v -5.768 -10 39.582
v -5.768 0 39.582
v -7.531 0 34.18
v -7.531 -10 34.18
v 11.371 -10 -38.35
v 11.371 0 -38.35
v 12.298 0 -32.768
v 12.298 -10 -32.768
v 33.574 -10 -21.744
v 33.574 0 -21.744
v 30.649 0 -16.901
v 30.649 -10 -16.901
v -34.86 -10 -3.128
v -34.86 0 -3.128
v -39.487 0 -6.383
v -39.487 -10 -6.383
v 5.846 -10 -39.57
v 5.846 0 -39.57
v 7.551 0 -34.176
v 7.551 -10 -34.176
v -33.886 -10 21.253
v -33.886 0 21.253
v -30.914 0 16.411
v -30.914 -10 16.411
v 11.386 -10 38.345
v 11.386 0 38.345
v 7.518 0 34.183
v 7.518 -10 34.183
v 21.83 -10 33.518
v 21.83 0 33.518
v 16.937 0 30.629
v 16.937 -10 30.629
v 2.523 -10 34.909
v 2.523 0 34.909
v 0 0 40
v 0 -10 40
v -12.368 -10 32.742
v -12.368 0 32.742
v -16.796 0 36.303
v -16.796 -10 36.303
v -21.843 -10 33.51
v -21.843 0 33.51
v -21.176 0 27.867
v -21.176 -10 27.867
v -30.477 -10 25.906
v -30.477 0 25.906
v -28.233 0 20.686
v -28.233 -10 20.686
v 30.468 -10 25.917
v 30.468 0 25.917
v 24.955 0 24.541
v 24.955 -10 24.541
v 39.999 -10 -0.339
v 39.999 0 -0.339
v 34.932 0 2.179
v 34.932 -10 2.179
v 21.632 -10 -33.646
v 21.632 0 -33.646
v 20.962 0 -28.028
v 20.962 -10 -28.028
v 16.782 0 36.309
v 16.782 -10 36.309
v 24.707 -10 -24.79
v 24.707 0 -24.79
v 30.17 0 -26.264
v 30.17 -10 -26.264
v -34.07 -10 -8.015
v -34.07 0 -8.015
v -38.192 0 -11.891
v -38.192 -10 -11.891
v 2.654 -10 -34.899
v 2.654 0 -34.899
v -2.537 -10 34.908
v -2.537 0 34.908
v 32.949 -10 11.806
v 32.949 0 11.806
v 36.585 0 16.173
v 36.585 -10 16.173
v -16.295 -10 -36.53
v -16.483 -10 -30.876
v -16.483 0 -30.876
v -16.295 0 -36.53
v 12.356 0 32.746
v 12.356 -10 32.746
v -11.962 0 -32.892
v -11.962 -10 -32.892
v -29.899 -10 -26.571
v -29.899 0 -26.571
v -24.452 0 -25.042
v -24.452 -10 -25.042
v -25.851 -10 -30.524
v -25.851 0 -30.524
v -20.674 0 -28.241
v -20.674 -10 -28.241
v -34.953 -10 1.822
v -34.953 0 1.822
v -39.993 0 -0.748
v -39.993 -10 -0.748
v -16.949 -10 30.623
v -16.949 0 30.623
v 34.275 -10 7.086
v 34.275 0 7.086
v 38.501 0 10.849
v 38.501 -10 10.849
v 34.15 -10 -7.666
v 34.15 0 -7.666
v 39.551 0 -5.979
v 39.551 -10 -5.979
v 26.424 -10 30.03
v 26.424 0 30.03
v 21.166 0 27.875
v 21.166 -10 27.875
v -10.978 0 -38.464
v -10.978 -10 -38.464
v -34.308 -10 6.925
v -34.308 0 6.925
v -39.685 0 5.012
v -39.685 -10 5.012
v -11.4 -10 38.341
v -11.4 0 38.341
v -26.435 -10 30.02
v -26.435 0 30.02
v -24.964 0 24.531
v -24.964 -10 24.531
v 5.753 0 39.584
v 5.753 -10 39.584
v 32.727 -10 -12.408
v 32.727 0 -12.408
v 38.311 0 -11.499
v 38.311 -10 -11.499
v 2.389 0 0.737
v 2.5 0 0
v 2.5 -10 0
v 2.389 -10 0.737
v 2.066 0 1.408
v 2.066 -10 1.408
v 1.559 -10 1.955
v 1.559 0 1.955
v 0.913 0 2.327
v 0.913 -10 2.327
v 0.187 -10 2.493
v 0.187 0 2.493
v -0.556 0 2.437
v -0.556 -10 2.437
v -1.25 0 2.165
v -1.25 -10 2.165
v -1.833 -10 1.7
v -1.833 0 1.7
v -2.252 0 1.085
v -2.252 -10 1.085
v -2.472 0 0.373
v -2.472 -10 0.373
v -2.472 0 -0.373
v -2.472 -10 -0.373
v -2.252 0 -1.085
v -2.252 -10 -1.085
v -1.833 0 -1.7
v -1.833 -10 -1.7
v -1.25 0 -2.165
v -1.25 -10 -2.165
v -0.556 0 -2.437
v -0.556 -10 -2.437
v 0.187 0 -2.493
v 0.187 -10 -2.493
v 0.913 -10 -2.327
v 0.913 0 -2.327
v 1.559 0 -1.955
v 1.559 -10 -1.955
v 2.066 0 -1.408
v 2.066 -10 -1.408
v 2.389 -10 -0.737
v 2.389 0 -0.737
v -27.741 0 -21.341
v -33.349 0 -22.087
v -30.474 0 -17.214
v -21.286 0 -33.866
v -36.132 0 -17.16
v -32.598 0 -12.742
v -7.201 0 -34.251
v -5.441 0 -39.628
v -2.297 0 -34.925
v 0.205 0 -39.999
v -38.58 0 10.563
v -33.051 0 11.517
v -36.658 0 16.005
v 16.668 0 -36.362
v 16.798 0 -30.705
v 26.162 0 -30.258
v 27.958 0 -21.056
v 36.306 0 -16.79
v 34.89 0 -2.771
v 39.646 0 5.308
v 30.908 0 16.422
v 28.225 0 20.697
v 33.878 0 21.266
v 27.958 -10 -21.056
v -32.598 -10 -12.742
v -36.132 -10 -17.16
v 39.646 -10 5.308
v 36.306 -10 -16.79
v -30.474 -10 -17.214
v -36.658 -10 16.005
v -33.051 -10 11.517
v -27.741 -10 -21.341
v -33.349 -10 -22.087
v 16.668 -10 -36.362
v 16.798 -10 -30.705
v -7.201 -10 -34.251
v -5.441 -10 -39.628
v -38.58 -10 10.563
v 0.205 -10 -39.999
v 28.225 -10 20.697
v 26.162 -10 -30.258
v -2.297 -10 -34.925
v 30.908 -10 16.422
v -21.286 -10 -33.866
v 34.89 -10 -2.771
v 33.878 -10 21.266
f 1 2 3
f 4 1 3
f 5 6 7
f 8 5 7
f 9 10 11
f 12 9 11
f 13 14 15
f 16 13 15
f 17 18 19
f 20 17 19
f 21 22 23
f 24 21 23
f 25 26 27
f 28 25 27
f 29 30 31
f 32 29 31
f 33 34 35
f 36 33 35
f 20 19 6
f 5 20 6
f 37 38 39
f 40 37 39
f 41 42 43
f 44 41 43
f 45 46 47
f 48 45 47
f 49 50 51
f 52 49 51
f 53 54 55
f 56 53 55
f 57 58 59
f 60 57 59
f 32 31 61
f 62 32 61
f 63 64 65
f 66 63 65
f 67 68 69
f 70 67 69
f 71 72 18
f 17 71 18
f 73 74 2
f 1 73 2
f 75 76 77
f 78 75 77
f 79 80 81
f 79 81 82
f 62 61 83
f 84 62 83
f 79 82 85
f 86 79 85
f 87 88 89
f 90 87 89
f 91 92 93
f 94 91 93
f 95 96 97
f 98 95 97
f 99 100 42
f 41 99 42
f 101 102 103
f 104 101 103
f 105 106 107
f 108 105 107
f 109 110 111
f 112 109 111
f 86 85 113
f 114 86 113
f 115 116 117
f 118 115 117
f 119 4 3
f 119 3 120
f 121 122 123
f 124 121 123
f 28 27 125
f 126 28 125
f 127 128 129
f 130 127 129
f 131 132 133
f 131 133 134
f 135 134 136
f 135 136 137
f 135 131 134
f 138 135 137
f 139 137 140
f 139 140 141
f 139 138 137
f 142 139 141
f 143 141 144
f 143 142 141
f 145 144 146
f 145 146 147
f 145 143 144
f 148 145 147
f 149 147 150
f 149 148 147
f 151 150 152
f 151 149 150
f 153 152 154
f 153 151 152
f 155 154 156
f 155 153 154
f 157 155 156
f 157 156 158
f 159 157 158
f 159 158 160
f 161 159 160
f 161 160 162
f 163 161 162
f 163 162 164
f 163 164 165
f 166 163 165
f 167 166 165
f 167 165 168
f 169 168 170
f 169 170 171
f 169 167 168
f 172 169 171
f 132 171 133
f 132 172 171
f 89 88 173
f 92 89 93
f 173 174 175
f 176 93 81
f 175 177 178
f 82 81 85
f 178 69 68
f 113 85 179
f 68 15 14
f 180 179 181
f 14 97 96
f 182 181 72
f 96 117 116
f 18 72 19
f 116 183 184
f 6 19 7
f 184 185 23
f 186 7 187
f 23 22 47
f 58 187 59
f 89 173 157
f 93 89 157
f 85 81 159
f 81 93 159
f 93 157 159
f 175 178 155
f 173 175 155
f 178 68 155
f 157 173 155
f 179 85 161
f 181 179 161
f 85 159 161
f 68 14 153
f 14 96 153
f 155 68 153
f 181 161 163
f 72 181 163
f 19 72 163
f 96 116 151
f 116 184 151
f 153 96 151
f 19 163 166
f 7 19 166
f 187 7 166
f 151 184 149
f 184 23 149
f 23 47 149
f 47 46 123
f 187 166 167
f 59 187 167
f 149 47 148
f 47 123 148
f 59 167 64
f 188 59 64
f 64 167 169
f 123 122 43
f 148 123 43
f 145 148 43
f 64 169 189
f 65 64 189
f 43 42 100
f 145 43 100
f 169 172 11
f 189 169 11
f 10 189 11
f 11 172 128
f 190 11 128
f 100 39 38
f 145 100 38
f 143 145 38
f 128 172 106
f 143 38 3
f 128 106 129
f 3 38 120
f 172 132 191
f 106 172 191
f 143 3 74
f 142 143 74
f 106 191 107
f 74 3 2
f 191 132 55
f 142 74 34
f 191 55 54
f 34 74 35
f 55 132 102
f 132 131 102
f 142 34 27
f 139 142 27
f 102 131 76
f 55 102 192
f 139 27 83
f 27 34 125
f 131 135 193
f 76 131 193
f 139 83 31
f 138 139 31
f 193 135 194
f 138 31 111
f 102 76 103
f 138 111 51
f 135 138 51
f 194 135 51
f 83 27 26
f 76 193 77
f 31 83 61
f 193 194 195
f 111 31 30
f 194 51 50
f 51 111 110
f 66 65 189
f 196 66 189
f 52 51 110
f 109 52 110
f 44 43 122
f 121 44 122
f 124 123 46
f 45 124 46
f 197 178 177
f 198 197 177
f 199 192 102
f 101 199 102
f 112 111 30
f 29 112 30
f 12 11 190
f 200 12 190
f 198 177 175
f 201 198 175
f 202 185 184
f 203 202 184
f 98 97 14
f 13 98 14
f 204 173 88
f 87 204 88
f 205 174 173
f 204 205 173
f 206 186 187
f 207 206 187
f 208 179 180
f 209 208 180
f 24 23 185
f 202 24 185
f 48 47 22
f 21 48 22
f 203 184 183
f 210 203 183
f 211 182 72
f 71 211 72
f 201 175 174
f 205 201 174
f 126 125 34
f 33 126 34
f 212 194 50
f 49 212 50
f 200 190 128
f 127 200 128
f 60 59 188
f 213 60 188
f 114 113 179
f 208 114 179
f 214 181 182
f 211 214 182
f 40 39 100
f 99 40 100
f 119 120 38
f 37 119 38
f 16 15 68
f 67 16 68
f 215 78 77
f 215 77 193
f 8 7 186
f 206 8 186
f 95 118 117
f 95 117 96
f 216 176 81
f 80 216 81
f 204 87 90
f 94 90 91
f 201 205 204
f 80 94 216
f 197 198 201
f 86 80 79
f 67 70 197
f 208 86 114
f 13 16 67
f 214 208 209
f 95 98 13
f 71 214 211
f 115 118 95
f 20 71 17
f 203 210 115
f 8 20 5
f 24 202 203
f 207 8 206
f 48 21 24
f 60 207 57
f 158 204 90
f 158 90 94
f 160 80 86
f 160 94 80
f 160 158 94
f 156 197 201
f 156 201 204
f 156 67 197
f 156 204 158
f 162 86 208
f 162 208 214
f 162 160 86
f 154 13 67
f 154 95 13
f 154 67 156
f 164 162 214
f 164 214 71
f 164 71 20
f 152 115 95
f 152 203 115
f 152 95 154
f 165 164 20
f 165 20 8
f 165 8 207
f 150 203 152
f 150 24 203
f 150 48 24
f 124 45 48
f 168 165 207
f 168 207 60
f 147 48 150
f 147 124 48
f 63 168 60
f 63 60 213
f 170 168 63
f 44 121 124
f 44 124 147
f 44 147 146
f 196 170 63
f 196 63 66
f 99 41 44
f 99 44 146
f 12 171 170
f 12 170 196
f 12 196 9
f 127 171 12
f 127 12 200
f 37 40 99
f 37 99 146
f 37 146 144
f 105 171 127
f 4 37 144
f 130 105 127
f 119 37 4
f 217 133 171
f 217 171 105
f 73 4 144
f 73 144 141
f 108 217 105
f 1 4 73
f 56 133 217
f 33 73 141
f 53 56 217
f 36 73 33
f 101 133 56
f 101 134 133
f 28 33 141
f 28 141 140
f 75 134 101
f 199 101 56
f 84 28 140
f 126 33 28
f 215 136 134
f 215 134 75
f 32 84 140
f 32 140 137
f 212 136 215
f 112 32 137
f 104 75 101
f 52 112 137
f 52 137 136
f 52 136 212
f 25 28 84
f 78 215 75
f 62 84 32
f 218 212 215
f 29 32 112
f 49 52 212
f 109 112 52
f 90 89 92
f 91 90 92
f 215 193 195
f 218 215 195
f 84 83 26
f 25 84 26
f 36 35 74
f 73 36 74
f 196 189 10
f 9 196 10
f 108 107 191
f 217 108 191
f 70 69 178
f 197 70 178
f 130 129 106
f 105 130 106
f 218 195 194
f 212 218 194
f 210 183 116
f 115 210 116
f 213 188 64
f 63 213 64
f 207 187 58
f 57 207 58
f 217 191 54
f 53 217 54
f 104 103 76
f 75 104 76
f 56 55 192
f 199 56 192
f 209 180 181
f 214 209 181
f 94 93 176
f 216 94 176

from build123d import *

# Parameters (mm, degrees)
F0_R     = 2.5
F1_DEPTH = 10


with BuildPart() as f1:
    # F0 (on Front) → F1 (new body)
    with BuildSketch(Plane.XZ):
        Polygon((2.523419, 34.908915), (0, 40), (-2.536541, 34.907964), (-5.767684, 39.581989), (-7.530638, 34.18025), (-11.400408, 38.340979), (-12.368155, 32.74185), (-16.796091, 36.302773), (-16.948511, 30.622671), (-21.842545, 33.509748), (-21.176467, 27.866777), (-26.434842, 30.019979), (-24.964116, 24.531468), (-30.477498, 25.906025), (-28.232704, 20.686093), (-33.886457, 21.253425), (-30.914268, 16.410607), (-36.658408, 16.005034), (-33.050996, 11.516582), (-38.580196, 10.5626), (-34.308045, 6.925175), (-39.684772, 5.011874), (-34.952549, 1.821893), (-39.993003, -0.748139), (-34.859956, -3.127857), (-39.487376, -6.383347), (-34.069918, -8.015029), (-38.191725, -11.890844), (-32.598243, -12.741843), (-36.13197, -17.160441), (-30.474374, -17.213731), (-33.349323, -22.086708), (-27.740803, -21.341224), (-29.899455, -26.571086), (-24.452222, -25.041742), (-25.851387, -30.523856), (-20.674425, -28.241249), (-21.286111, -33.865934), (-16.482993, -30.875734), (-16.294963, -36.530456), (-11.961787, -32.892486), (-10.977801, -38.464112), (-7.20126, -34.251158), (-5.441006, -39.628215), (-2.296658, -34.924567), (0.204647, -39.999476), (2.653894, -34.899238), (5.846206, -39.570467), (7.551349, -34.17568), (11.3708, -38.349771), (12.297724, -32.768369), (16.667898, -36.361809), (16.798058, -30.705459), (21.631521, -33.646357), (20.962313, -28.028225), (26.162361, -30.25774), (24.707175, -24.79023), (30.169771, -26.263757), (27.95772, -21.056256), (33.573573, -21.744314), (30.648913, -16.901009), (36.305668, -16.789832), (32.726914, -12.407623), (38.311395, -11.499435), (34.150146, -7.665998), (39.550625, -5.978969), (34.890136, -2.770998), (39.998564, -0.338882), (34.932078, 2.17944), (39.646252, 5.307986), (34.275132, 7.086275), (38.500736, 10.848656), (32.948618, 11.806293), (36.584761, 16.17267), (30.908097, 16.422226), (33.878465, 21.266161), (28.224926, 20.696704), (30.467758, 25.917479), (24.954893, 24.54085), (26.423556, 30.029913), (21.16599, 27.874735), (21.829947, 33.517956), (16.936998, 30.62904), (16.782444, 36.309084), (12.355847, 32.746497), (11.385994, 38.345262), (7.517789, 34.183078), (5.752804, 39.584154), align=None)
        Circle(F0_R, mode=Mode.SUBTRACT)
    extrude(amount=F1_DEPTH)


solid = f1.part
